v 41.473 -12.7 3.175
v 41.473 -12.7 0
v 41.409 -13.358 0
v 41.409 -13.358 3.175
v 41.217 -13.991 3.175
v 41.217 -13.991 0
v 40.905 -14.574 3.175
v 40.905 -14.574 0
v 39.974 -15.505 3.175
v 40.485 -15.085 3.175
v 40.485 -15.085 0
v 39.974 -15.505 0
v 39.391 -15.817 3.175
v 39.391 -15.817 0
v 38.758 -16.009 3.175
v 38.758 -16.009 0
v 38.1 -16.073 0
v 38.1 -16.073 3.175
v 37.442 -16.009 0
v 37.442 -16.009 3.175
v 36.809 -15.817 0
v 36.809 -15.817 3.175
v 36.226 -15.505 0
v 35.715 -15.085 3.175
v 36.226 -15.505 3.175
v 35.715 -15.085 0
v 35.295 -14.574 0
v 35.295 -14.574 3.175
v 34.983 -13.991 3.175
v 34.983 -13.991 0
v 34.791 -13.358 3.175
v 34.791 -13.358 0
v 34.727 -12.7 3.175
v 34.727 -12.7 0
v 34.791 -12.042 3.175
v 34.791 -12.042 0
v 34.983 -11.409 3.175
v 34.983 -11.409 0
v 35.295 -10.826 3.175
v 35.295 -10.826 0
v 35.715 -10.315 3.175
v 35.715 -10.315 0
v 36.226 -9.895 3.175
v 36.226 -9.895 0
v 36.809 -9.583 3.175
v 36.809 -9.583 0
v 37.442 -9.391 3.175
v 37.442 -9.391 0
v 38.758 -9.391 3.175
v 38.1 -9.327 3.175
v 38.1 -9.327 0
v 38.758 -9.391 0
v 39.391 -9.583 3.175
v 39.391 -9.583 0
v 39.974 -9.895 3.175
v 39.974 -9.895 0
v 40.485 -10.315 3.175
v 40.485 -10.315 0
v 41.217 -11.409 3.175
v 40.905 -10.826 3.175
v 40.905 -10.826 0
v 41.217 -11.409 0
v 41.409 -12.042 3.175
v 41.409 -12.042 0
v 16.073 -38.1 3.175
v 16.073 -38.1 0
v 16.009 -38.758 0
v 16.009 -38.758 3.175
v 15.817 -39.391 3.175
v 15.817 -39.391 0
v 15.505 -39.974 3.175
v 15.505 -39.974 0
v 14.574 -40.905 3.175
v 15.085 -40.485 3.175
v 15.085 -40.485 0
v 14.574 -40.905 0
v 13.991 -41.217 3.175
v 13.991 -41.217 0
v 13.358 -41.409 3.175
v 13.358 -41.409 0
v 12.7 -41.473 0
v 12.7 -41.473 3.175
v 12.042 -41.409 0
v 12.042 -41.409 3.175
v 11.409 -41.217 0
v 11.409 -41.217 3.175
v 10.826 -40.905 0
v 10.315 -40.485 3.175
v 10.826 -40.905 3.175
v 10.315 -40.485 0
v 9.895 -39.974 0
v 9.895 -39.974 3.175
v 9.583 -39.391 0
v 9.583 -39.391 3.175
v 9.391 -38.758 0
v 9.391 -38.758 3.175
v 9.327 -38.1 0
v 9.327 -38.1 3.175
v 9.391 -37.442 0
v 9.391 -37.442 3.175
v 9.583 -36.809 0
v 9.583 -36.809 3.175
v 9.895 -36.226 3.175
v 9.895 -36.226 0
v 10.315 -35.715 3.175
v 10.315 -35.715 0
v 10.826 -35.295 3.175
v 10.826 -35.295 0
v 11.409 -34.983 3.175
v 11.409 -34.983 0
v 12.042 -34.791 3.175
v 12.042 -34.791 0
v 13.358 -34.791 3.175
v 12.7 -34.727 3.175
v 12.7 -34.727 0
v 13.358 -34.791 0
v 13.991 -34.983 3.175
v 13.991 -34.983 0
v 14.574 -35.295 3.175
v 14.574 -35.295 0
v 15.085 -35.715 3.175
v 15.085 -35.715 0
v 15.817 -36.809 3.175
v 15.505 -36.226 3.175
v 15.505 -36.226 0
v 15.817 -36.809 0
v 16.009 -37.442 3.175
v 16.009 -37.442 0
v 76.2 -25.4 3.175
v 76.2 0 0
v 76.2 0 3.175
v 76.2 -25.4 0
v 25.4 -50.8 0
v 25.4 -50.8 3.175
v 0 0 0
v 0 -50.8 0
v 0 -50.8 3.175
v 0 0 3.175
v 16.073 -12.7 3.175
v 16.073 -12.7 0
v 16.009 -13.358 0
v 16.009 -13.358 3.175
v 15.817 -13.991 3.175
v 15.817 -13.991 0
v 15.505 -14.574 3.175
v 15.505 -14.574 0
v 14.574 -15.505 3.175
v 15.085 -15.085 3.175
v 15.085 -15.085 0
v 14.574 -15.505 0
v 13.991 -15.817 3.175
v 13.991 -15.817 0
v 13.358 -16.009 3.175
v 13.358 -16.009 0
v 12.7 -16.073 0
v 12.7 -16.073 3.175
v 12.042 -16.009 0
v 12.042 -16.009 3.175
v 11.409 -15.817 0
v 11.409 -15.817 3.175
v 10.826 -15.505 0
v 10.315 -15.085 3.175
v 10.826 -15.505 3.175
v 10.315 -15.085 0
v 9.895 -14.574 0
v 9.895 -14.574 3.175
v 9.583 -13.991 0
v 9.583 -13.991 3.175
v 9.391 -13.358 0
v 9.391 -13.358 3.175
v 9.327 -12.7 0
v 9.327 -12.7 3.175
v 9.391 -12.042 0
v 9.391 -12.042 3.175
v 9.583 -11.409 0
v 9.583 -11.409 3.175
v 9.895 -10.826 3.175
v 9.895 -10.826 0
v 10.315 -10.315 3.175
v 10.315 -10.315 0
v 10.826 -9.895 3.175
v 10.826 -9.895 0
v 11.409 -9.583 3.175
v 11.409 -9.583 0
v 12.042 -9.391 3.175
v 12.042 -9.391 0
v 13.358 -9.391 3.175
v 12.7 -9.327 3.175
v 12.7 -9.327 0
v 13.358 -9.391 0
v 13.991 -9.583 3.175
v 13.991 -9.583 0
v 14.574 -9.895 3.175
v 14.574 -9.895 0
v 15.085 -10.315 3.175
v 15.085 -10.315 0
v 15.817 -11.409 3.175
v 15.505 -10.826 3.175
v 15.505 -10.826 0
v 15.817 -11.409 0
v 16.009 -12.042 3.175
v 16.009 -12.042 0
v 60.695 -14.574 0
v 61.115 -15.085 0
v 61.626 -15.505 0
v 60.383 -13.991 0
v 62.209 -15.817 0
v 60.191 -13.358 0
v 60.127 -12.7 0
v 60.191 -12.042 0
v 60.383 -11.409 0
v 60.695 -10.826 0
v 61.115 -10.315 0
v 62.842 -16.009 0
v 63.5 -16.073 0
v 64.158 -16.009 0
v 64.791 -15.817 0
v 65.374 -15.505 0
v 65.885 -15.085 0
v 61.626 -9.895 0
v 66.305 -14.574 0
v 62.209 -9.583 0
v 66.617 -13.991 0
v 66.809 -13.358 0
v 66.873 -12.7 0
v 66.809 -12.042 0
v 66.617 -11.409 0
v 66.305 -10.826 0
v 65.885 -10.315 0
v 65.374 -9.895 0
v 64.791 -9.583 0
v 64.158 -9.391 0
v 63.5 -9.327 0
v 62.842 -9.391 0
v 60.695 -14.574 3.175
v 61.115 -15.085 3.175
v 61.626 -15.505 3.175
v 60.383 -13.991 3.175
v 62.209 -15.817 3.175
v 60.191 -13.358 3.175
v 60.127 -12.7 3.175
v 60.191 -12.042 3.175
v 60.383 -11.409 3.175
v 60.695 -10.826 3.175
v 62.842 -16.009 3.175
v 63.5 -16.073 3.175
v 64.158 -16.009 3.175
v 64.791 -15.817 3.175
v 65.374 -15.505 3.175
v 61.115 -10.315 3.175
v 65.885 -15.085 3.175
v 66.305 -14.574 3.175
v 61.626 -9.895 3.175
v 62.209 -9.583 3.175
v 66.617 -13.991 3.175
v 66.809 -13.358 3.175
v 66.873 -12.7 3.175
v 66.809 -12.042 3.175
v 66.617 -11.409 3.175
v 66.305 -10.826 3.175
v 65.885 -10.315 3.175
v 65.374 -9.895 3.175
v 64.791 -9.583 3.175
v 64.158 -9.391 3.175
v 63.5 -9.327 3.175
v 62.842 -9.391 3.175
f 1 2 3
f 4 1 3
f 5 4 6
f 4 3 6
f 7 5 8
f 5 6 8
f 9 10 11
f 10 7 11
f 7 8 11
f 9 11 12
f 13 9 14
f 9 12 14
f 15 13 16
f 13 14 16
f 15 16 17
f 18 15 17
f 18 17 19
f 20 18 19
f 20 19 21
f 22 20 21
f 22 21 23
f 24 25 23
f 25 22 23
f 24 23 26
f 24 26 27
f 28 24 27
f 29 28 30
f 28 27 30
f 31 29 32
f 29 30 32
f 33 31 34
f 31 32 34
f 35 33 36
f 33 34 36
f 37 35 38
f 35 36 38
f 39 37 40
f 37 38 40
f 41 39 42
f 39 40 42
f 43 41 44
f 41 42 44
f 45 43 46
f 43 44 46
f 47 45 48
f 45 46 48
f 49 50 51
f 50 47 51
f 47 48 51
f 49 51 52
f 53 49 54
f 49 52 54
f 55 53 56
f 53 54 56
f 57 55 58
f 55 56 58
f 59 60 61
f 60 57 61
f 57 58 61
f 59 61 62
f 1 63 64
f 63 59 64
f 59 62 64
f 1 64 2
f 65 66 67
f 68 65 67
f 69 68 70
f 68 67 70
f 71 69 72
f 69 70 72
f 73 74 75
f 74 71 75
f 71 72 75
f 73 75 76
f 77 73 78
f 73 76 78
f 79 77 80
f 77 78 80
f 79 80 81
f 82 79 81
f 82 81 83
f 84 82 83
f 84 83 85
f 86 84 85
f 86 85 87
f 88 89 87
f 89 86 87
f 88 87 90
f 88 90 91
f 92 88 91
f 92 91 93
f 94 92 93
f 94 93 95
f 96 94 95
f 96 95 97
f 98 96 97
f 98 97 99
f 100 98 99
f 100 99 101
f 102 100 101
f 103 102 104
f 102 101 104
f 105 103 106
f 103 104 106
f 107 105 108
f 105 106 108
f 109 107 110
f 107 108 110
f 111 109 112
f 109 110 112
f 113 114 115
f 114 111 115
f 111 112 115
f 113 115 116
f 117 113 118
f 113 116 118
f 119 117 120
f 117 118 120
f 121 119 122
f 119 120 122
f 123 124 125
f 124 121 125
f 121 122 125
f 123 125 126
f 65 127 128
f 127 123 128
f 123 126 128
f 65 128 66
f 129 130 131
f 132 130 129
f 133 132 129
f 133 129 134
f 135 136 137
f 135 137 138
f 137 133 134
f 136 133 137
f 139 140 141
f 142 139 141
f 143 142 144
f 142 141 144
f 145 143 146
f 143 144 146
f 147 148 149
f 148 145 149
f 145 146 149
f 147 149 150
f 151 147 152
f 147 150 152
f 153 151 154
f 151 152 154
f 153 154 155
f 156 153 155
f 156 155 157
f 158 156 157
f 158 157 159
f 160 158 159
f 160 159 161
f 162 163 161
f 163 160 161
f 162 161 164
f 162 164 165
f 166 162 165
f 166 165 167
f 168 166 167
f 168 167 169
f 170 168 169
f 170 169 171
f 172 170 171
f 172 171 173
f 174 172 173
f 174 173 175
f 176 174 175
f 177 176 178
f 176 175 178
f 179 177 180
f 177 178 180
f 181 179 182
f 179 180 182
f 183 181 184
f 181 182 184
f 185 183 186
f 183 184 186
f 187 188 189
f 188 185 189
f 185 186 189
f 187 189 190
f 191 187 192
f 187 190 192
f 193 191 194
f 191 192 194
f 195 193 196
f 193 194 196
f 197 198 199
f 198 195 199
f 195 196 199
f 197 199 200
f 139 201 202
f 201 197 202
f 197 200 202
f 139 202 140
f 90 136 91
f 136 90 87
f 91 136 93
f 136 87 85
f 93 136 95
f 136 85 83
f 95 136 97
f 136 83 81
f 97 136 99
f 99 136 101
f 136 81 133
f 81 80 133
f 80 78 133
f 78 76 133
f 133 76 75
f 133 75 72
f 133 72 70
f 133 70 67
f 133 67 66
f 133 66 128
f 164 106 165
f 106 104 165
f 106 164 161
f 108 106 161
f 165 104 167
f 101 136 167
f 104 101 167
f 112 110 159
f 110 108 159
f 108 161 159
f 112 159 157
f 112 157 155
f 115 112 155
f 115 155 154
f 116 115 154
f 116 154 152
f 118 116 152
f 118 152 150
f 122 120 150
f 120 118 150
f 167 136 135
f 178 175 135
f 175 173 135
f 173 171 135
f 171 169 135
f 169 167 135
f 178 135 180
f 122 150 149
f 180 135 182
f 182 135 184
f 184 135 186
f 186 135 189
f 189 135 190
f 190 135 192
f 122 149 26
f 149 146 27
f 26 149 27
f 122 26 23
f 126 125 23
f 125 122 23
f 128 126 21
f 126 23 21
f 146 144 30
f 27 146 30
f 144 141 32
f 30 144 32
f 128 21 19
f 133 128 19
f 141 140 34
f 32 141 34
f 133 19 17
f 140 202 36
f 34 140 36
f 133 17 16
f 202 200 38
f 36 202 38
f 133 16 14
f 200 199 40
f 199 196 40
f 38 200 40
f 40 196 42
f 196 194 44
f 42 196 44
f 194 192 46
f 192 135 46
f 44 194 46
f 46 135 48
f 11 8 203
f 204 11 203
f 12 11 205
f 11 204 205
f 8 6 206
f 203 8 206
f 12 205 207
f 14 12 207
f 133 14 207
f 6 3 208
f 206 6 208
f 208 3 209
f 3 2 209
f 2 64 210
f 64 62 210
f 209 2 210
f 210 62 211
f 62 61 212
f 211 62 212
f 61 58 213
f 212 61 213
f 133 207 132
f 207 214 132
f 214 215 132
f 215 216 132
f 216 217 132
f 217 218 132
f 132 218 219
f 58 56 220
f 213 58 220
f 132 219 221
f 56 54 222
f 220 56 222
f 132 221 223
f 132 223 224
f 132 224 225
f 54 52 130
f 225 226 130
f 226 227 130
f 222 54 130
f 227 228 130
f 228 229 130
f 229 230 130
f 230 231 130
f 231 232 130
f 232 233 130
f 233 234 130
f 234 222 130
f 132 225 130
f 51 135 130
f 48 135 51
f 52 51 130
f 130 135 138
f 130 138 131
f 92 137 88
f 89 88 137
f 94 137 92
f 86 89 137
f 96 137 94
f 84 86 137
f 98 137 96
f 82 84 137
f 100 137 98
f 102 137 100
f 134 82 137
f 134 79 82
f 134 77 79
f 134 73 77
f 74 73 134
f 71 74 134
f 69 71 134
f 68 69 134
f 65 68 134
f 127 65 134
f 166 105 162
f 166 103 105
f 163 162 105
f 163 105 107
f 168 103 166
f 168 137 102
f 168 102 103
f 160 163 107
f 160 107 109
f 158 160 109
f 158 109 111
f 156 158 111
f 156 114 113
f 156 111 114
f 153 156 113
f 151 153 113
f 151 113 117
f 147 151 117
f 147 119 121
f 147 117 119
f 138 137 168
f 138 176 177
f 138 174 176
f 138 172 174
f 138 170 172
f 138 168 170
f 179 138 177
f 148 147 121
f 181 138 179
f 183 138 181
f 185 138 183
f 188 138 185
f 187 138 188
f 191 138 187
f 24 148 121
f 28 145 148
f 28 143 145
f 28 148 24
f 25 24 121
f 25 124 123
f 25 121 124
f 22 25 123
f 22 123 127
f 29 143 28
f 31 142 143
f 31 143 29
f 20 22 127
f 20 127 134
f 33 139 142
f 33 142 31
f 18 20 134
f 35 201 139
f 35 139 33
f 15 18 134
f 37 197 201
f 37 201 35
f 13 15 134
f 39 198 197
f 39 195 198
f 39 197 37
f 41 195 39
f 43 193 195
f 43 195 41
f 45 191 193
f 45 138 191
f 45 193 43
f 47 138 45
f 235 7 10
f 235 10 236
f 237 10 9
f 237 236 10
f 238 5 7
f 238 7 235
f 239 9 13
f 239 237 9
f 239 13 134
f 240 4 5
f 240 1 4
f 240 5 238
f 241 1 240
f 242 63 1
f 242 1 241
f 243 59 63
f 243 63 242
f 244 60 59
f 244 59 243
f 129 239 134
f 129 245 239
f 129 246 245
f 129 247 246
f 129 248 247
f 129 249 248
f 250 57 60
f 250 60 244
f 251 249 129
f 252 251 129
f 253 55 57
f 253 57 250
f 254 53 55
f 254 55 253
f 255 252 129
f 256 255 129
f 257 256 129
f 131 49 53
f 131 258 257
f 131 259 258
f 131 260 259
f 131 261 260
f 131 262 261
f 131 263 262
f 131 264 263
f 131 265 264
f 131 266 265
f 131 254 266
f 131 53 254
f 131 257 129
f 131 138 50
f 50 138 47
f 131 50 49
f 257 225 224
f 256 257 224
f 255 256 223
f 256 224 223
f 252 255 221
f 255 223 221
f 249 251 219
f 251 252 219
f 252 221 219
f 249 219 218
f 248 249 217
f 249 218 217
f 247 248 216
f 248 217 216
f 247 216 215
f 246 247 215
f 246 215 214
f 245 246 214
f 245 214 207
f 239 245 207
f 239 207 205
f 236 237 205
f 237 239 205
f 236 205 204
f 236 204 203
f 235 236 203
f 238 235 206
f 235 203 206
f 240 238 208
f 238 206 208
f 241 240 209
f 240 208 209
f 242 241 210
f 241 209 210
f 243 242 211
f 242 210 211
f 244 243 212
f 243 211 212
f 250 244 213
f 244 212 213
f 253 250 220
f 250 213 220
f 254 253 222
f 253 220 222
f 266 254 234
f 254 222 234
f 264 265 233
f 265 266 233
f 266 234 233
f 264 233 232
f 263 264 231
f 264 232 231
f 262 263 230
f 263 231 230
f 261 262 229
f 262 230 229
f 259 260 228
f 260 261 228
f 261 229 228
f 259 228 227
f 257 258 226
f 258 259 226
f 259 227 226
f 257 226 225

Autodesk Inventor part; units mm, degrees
ref_plane "YZ Plane" through (0, 0, 0) normal (1, 0, 0) x (0, 1, 0)
ref_plane "XZ Plane" through (0, 0, 0) normal (0, 1, 0) x (-1, 0, 0)
ref_plane "XY Plane" through (0, 0, 0) normal (0, 0, 1) x (1, 0, 0)
sketch "Sketch1" plane through (0, 0, 0) normal (0, 0, 1) x (1, 0, 0)
  line L0 (0, 0) -> (76.2, 0)
  line L1 (76.2, 0) -> (76.2, -25.4)
  line L2 (76.2, -25.4) -> (25.4, -50.8)
  line L3 (25.4, -50.8) -> (0, -50.8)
  line L4 (0, -50.8) -> (0, 0)
  circle A0 centre (63.5, -12.7) radius 3.3734
  circle A1 centre (38.1, -12.7) radius 3.3734
  circle A2 centre (12.7, -12.7) radius 3.3734
  circle A3 centre (12.7, -38.1) radius 3.3734
  dimension "d0" = 25.4
  dimension "d1" = 25.4
  dimension "d2" = 76.2
  dimension "d3" = 50.8
  dimension "d4" = 6.7469
  dimension "d5" = 12.7
  dimension "d6" = 12.7
  dimension "d7" = 12.7
  dimension "d8" = 12.7
  dimension "d9" = 12.7
  dimension "d10" = 38.1
  dimension "d11" = 12.7
  dimension "d12" = 12.7
extrude "Extrusion1" add sketch "Sketch1" along normal blind 3.175
properties part number "bottom gusset"
